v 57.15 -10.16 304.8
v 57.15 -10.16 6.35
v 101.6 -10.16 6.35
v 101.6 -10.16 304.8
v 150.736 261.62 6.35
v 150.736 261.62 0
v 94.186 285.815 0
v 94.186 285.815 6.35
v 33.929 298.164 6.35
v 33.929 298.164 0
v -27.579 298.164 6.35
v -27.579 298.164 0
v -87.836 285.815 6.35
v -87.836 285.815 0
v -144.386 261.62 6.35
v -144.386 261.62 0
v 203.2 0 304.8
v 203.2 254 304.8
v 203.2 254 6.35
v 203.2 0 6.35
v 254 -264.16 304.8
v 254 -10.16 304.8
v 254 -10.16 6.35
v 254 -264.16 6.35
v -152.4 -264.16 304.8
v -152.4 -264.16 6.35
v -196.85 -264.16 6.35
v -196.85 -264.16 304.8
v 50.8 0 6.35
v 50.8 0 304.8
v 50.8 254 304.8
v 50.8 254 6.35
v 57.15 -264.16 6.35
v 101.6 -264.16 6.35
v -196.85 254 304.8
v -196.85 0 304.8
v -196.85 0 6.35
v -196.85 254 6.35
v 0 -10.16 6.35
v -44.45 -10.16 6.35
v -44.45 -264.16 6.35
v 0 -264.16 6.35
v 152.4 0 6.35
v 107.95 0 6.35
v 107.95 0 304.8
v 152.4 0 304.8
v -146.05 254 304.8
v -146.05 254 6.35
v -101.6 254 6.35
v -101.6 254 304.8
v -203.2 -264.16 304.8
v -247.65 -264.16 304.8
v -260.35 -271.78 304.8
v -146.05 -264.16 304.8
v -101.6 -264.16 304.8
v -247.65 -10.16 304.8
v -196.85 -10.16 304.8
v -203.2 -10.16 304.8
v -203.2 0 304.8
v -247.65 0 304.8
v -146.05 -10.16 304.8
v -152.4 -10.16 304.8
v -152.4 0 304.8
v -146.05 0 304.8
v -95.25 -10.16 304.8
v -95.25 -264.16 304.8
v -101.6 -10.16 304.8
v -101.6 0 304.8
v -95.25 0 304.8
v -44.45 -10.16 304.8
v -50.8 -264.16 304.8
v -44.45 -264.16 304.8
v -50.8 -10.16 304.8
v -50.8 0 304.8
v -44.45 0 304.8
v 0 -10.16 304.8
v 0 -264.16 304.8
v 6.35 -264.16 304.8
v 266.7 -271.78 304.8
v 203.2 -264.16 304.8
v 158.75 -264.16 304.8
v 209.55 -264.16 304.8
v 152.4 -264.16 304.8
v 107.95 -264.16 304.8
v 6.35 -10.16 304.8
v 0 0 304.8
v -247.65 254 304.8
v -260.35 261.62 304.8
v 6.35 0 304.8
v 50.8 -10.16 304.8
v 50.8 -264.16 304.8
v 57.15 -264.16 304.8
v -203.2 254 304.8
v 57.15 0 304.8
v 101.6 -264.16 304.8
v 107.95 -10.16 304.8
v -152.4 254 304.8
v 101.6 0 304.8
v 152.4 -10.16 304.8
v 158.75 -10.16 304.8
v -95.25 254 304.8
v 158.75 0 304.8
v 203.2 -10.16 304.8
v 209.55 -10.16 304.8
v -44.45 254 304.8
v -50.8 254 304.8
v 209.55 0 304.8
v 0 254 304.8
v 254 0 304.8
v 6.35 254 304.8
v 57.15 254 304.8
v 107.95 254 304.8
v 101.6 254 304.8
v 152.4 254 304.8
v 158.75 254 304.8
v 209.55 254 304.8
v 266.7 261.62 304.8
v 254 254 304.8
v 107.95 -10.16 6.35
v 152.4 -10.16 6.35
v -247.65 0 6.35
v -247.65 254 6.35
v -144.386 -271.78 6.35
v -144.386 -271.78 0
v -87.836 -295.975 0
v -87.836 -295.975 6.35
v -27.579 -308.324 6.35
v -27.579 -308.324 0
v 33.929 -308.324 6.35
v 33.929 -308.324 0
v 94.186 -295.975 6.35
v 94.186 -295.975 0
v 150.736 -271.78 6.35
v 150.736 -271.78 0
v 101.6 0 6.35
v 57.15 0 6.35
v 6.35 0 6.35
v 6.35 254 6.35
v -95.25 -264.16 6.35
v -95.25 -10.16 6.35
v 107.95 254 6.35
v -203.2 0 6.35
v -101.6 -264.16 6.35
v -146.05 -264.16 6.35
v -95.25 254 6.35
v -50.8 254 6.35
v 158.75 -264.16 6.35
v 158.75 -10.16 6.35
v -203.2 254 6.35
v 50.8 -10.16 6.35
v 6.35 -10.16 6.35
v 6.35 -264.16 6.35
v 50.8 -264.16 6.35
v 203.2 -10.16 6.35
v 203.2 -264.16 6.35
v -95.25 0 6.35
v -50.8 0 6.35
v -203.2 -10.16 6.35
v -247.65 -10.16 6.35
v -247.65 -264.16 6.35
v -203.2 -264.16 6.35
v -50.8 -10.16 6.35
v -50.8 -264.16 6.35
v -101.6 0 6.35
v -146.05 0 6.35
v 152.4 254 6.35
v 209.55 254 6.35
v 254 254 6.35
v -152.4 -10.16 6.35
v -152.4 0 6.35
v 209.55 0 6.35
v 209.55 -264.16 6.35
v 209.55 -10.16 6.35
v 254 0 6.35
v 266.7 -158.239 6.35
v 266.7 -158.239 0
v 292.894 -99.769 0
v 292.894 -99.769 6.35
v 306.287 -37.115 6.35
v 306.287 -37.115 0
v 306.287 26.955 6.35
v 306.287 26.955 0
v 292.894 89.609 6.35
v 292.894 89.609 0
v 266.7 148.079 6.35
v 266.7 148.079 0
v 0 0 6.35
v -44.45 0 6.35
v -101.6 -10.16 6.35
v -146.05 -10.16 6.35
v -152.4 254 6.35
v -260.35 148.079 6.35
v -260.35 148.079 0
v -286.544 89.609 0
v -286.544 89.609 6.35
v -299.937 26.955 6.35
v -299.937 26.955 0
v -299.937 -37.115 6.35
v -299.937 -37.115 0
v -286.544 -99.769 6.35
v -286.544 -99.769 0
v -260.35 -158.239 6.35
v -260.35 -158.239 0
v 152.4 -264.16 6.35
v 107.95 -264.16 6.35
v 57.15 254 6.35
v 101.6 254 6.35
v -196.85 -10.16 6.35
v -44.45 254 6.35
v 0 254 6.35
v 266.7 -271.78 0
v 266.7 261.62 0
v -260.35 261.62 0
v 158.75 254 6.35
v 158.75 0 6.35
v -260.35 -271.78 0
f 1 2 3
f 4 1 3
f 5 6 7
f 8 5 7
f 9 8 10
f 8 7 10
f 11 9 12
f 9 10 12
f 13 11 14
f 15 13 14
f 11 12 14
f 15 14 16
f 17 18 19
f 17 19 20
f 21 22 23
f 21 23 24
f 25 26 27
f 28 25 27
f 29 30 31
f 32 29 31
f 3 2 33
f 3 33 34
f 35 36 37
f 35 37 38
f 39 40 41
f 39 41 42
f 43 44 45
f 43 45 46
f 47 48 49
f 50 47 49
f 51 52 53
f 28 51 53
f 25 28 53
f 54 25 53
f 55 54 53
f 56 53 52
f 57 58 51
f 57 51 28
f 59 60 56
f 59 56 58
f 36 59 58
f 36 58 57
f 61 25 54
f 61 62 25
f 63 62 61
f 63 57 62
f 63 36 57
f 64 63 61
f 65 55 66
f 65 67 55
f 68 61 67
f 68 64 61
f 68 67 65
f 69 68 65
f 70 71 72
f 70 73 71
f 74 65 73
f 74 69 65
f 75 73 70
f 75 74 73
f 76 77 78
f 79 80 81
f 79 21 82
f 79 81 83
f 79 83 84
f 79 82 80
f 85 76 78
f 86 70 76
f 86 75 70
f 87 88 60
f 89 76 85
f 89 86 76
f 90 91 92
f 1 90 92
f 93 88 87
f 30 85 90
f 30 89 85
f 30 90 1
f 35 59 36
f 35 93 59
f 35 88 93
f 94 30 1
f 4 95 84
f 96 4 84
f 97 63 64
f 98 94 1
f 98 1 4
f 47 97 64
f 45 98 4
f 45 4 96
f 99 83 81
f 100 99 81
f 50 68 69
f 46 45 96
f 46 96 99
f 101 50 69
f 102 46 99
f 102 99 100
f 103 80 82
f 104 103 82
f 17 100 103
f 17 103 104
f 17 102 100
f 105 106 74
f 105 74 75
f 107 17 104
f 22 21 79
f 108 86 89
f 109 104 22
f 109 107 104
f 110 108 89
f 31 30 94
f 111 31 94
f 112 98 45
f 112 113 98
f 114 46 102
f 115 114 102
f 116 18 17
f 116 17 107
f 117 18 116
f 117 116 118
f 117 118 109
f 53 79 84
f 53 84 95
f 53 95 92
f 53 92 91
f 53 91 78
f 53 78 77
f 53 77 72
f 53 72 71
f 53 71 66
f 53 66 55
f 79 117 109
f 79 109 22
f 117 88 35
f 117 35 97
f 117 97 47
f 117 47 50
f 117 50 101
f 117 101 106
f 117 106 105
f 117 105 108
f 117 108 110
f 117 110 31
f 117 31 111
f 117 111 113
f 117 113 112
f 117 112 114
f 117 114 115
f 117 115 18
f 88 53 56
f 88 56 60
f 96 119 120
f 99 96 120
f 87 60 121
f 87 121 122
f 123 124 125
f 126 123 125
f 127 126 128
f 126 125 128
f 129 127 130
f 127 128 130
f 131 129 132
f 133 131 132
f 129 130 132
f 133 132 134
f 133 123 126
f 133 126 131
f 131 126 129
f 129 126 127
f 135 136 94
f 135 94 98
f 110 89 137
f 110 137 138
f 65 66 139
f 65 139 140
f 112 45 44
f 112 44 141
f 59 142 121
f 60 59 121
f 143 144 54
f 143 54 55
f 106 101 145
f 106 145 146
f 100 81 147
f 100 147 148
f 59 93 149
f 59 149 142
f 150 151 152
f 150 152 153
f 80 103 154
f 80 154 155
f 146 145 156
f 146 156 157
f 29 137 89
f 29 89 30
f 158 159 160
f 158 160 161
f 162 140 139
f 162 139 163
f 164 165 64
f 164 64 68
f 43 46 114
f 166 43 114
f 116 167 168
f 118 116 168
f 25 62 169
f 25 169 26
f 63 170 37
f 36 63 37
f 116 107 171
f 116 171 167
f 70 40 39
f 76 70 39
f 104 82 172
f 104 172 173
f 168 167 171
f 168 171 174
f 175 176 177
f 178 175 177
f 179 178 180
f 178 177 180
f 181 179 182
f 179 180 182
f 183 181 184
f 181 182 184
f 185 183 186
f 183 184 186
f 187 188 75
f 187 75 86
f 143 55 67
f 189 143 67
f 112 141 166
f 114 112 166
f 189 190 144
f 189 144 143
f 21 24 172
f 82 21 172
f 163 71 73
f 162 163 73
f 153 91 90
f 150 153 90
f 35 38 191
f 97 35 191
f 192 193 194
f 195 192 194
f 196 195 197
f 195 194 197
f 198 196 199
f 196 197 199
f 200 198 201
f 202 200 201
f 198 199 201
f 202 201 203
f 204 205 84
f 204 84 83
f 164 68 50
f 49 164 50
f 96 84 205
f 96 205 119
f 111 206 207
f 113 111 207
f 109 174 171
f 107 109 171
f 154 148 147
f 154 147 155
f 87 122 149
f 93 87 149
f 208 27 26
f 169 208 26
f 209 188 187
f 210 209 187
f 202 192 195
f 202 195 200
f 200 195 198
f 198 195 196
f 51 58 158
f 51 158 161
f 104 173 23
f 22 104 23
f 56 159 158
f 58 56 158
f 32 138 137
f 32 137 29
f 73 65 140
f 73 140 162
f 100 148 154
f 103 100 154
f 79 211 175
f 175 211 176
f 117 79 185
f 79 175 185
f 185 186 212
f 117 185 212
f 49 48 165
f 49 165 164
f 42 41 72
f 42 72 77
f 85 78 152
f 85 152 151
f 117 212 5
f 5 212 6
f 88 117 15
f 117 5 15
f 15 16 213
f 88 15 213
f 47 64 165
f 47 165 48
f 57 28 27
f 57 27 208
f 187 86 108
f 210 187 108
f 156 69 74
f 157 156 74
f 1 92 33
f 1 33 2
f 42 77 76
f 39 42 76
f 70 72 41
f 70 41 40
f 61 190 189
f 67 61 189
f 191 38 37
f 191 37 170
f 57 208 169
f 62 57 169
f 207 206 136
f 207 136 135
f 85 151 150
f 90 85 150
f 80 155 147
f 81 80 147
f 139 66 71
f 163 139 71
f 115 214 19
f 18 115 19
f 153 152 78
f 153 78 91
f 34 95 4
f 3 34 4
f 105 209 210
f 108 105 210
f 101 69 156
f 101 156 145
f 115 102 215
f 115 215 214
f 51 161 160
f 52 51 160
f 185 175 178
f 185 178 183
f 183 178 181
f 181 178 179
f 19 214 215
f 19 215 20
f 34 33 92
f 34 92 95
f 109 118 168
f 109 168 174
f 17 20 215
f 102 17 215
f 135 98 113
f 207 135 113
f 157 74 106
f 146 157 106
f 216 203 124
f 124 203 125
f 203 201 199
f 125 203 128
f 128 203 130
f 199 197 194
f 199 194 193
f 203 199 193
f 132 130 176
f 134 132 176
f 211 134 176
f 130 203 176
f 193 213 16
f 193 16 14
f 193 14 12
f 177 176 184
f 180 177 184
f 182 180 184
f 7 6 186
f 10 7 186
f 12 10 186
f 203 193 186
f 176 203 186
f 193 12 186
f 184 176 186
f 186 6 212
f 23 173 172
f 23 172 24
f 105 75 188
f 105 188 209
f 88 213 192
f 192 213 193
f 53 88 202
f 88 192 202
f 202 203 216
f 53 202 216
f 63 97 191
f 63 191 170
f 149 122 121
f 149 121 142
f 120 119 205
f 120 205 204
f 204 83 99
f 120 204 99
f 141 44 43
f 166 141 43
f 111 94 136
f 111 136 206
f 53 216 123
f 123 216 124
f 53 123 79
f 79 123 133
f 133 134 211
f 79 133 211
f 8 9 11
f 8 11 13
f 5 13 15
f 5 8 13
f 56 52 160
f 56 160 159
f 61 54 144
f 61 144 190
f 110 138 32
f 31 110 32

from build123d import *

# Parameters (mm, degrees)
F0_W     = 44.45
F0_H     = 254
F1_DEPTH = 304.8
F2_DEPTH = 6.35


with BuildPart() as f1:
    # F0 (on Top) → F1 (new body)
    with BuildSketch(Plane.XY):
        with BuildLine():
            ThreePointArc((-247.65, -178.2558048198), (-254.1946774379, -168.3708115465), (-260.35, -158.2387881089))
            Line((-260.35, -158.2387881089), (-260.35, -271.78))
            Line((-260.35, -271.78), (-144.3856654905, -271.78))
            ThreePointArc((-144.3856654905, -271.78), (-150.9341183646, -268.0503778696), (-157.3883631935, -264.16))
            Line((-157.3883631935, -264.16), (-196.85, -264.16))
            Line((-196.85, -264.16), (-196.85, -235.0648677087))
            ThreePointArc((-196.85, -235.0648677087), (-200.0448497603, -232.2467507876), (-203.2, -229.384256257))
            Line((-203.2, -229.384256257), (-203.2, -264.16))
            Line((-203.2, -264.16), (-247.65, -264.16))
            Line((-247.65, -264.16), (-247.65, -178.2558048198))
        make_face()
        with BuildLine():
            Line((150.7356654905, 261.62), (-144.3856654905, 261.62))
            ThreePointArc((-144.3856654905, 261.62), (-150.9341183646, 257.8903778696), (-157.3883631935, 254))
            Line((-157.3883631935, 254), (-152.4, 254))
            Line((-152.4, 254), (-152.4, 0))
            Line((-152.4, 0), (-196.85, 0))
            Line((-196.85, 0), (-196.85, 224.9048677087))
            ThreePointArc((-196.85, 224.9048677087), (-200.0448497603, 222.0867507876), (-203.2, 219.224256257))
            Line((-203.2, 219.224256257), (-203.2, 0))
            Line((-203.2, 0), (-247.65, 0))
            Line((-247.65, 0), (-247.65, 168.0958048198))
            ThreePointArc((-247.65, 168.0958048198), (-254.1946774379, 158.2108115465), (-260.35, 148.0787881089))
            Line((-260.35, 148.0787881089), (-260.35, -158.2387881089))
            ThreePointArc((-260.35, -158.2387881089), (-254.1946774379, -168.3708115465), (-247.65, -178.2558048198))
            Line((-247.65, -178.2558048198), (-247.65, -10.16))
            Line((-247.65, -10.16), (-203.2, -10.16))
            Line((-203.2, -10.16), (-203.2, -229.384256257))
            ThreePointArc((-203.2, -229.384256257), (-200.0448497603, -232.2467507876), (-196.85, -235.0648677087))
            Line((-196.85, -235.0648677087), (-196.85, -10.16))
            Line((-196.85, -10.16), (-152.4, -10.16))
            Line((-152.4, -10.16), (-152.4, -264.16))
            Line((-152.4, -264.16), (-157.3883631935, -264.16))
            ThreePointArc((-157.3883631935, -264.16), (-150.9341183646, -268.0503778696), (-144.3856654905, -271.78))
            Line((-144.3856654905, -271.78), (150.7356654905, -271.78))
            ThreePointArc((150.7356654905, -271.78), (157.2841183646, -268.0503778696), (163.7383631935, -264.16))
            Line((163.7383631935, -264.16), (158.75, -264.16))
            Line((158.75, -264.16), (158.75, -10.16))
            Line((158.75, -10.16), (203.2, -10.16))
            Line((203.2, -10.16), (203.2, -235.0648677087))
            ThreePointArc((203.2, -235.0648677087), (206.3948497603, -232.2467507876), (209.55, -229.384256257))
            Line((209.55, -229.384256257), (209.55, -10.16))
            Line((209.55, -10.16), (254, -10.16))
            Line((254, -10.16), (254, -178.2558048198))
            ThreePointArc((254, -178.2558048198), (260.5446774379, -168.3708115465), (266.7, -158.2387881089))
            Line((266.7, -158.2387881089), (266.7, 148.0787881089))
            ThreePointArc((266.7, 148.0787881089), (260.5446774379, 158.2108115465), (254, 168.0958048198))
            Line((254, 168.0958048198), (254, 0))
            Line((254, 0), (209.55, 0))
            Line((209.55, 0), (209.55, 219.224256257))
            ThreePointArc((209.55, 219.224256257), (206.3948497603, 222.0867507876), (203.2, 224.9048677087))
            Line((203.2, 224.9048677087), (203.2, 0))
            Line((203.2, 0), (158.75, 0))
            Line((158.75, 0), (158.75, 254))
            Line((158.75, 254), (163.7383631935, 254))
            ThreePointArc((163.7383631935, 254), (157.2841183646, 257.8903778696), (150.7356654905, 261.62))
        make_face()
        with Locations((-123.825, -137.16)):
            Rectangle(F0_W, F0_H, mode=Mode.SUBTRACT)
        with Locations((-73.025, -137.16)):
            Rectangle(F0_W, F0_H, mode=Mode.SUBTRACT)
        with Locations((-22.225, -137.16)):
            Rectangle(F0_W, F0_H, mode=Mode.SUBTRACT)
        with Locations((28.575, -137.16)):
            Rectangle(F0_W, F0_H, mode=Mode.SUBTRACT)
        with Locations((79.375, -137.16)):
            Rectangle(F0_W, F0_H, mode=Mode.SUBTRACT)
        with Locations((130.175, -137.16)):
            Rectangle(F0_W, F0_H, mode=Mode.SUBTRACT)
        with Locations((-123.825, 127)):
            Rectangle(F0_W, F0_H, mode=Mode.SUBTRACT)
        with Locations((-73.025, 127)):
            Rectangle(F0_W, F0_H, mode=Mode.SUBTRACT)
        with Locations((-22.225, 127)):
            Rectangle(F0_W, F0_H, mode=Mode.SUBTRACT)
        with Locations((28.575, 127)):
            Rectangle(F0_W, F0_H, mode=Mode.SUBTRACT)
        with Locations((79.375, 127)):
            Rectangle(F0_W, F0_H, mode=Mode.SUBTRACT)
        with Locations((130.175, 127)):
            Rectangle(F0_W, F0_H, mode=Mode.SUBTRACT)
        with BuildLine():
            Line((-144.3856654905, 261.62), (-260.35, 261.62))
            Line((-260.35, 261.62), (-260.35, 148.0787881089))
            ThreePointArc((-260.35, 148.0787881089), (-254.1946774379, 158.2108115465), (-247.65, 168.0958048198))
            Line((-247.65, 168.0958048198), (-247.65, 254))
            Line((-247.65, 254), (-203.2, 254))
            Line((-203.2, 254), (-203.2, 219.224256257))
            ThreePointArc((-203.2, 219.224256257), (-200.0448497603, 222.0867507876), (-196.85, 224.9048677087))
            Line((-196.85, 224.9048677087), (-196.85, 254))
            Line((-196.85, 254), (-157.3883631935, 254))
            ThreePointArc((-157.3883631935, 254), (-150.9341183646, 257.8903778696), (-144.3856654905, 261.62))
        make_face()
        with BuildLine():
            Line((266.7, 261.62), (150.7356654905, 261.62))
            ThreePointArc((150.7356654905, 261.62), (157.2841183646, 257.8903778696), (163.7383631935, 254))
            Line((163.7383631935, 254), (203.2, 254))
            Line((203.2, 254), (203.2, 224.9048677087))
            ThreePointArc((203.2, 224.9048677087), (206.3948497603, 222.0867507876), (209.55, 219.224256257))
            Line((209.55, 219.224256257), (209.55, 254))
            Line((209.55, 254), (254, 254))
            Line((254, 254), (254, 168.0958048198))
            ThreePointArc((254, 168.0958048198), (260.5446774379, 158.2108115465), (266.7, 148.0787881089))
            Line((266.7, 148.0787881089), (266.7, 261.62))
        make_face()
        with BuildLine():
            Line((266.7, -271.78), (266.7, -158.2387881089))
            ThreePointArc((266.7, -158.2387881089), (260.5446774379, -168.3708115465), (254, -178.2558048198))
            Line((254, -178.2558048198), (254, -264.16))
            Line((254, -264.16), (209.55, -264.16))
            Line((209.55, -264.16), (209.55, -229.384256257))
            ThreePointArc((209.55, -229.384256257), (206.3948497603, -232.2467507876), (203.2, -235.0648677087))
            Line((203.2, -235.0648677087), (203.2, -264.16))
            Line((203.2, -264.16), (163.7383631935, -264.16))
            ThreePointArc((163.7383631935, -264.16), (157.2841183646, -268.0503778696), (150.7356654905, -271.78))
            Line((150.7356654905, -271.78), (266.7, -271.78))
        make_face()
    extrude(amount=F1_DEPTH)

    # F0 (on Top) → F2 (join)
    with BuildSketch(Plane.XY):
        with BuildLine():
            Line((-260.35, -158.2387881089), (-260.35, 148.0787881089))
            ThreePointArc((-260.35, 148.0787881089), (-301.625, -5.08), (-260.35, -158.2387881089))
        make_face()
        with BuildLine():
            Line((150.7356654905, 261.62), (-144.3856654905, 261.62))
            ThreePointArc((-144.3856654905, 261.62), (-150.9341183646, 257.8903778696), (-157.3883631935, 254))
            Line((-157.3883631935, 254), (-152.4, 254))
            Line((-152.4, 254), (-152.4, 0))
            Line((-152.4, 0), (-196.85, 0))
            Line((-196.85, 0), (-196.85, 224.9048677087))
            ThreePointArc((-196.85, 224.9048677087), (-200.0448497603, 222.0867507876), (-203.2, 219.224256257))
            Line((-203.2, 219.224256257), (-203.2, 0))
            Line((-203.2, 0), (-247.65, 0))
            Line((-247.65, 0), (-247.65, 168.0958048198))
            ThreePointArc((-247.65, 168.0958048198), (-254.1946774379, 158.2108115465), (-260.35, 148.0787881089))
            Line((-260.35, 148.0787881089), (-260.35, -158.2387881089))
            ThreePointArc((-260.35, -158.2387881089), (-254.1946774379, -168.3708115465), (-247.65, -178.2558048198))
            Line((-247.65, -178.2558048198), (-247.65, -10.16))
            Line((-247.65, -10.16), (-203.2, -10.16))
            Line((-203.2, -10.16), (-203.2, -229.384256257))
            ThreePointArc((-203.2, -229.384256257), (-200.0448497603, -232.2467507876), (-196.85, -235.0648677087))
            Line((-196.85, -235.0648677087), (-196.85, -10.16))
            Line((-196.85, -10.16), (-152.4, -10.16))
            Line((-152.4, -10.16), (-152.4, -264.16))
            Line((-152.4, -264.16), (-157.3883631935, -264.16))
            ThreePointArc((-157.3883631935, -264.16), (-150.9341183646, -268.0503778696), (-144.3856654905, -271.78))
            Line((-144.3856654905, -271.78), (150.7356654905, -271.78))
            ThreePointArc((150.7356654905, -271.78), (157.2841183646, -268.0503778696), (163.7383631935, -264.16))
            Line((163.7383631935, -264.16), (158.75, -264.16))
            Line((158.75, -264.16), (158.75, -10.16))
            Line((158.75, -10.16), (203.2, -10.16))
            Line((203.2, -10.16), (203.2, -235.0648677087))
            ThreePointArc((203.2, -235.0648677087), (206.3948497603, -232.2467507876), (209.55, -229.384256257))
            Line((209.55, -229.384256257), (209.55, -10.16))
            Line((209.55, -10.16), (254, -10.16))
            Line((254, -10.16), (254, -178.2558048198))
            ThreePointArc((254, -178.2558048198), (260.5446774379, -168.3708115465), (266.7, -158.2387881089))
            Line((266.7, -158.2387881089), (266.7, 148.0787881089))
            ThreePointArc((266.7, 148.0787881089), (260.5446774379, 158.2108115465), (254, 168.0958048198))
            Line((254, 168.0958048198), (254, 0))
            Line((254, 0), (209.55, 0))
            Line((209.55, 0), (209.55, 219.224256257))
            ThreePointArc((209.55, 219.224256257), (206.3948497603, 222.0867507876), (203.2, 224.9048677087))
            Line((203.2, 224.9048677087), (203.2, 0))
            Line((203.2, 0), (158.75, 0))
            Line((158.75, 0), (158.75, 254))
            Line((158.75, 254), (163.7383631935, 254))
            ThreePointArc((163.7383631935, 254), (157.2841183646, 257.8903778696), (150.7356654905, 261.62))
        make_face()
        with Locations((-123.825, -137.16)):
            Rectangle(F0_W, F0_H, mode=Mode.SUBTRACT)
        with Locations((-73.025, -137.16)):
            Rectangle(F0_W, F0_H, mode=Mode.SUBTRACT)
        with Locations((-22.225, -137.16)):
            Rectangle(F0_W, F0_H, mode=Mode.SUBTRACT)
        with Locations((28.575, -137.16)):
            Rectangle(F0_W, F0_H, mode=Mode.SUBTRACT)
        with Locations((79.375, -137.16)):
            Rectangle(F0_W, F0_H, mode=Mode.SUBTRACT)
        with Locations((130.175, -137.16)):
            Rectangle(F0_W, F0_H, mode=Mode.SUBTRACT)
        with Locations((-123.825, 127)):
            Rectangle(F0_W, F0_H, mode=Mode.SUBTRACT)
        with Locations((-73.025, 127)):
            Rectangle(F0_W, F0_H, mode=Mode.SUBTRACT)
        with Locations((-22.225, 127)):
            Rectangle(F0_W, F0_H, mode=Mode.SUBTRACT)
        with Locations((28.575, 127)):
            Rectangle(F0_W, F0_H, mode=Mode.SUBTRACT)
        with Locations((79.375, 127)):
            Rectangle(F0_W, F0_H, mode=Mode.SUBTRACT)
        with Locations((130.175, 127)):
            Rectangle(F0_W, F0_H, mode=Mode.SUBTRACT)
        with BuildLine():
            Line((-247.65, -10.16), (-247.65, -178.2558048198))
            ThreePointArc((-247.65, -178.2558048198), (-226.8499761147, -205.0588747928), (-203.2, -229.384256257))
            Line((-203.2, -229.384256257), (-203.2, -10.16))
            Line((-203.2, -10.16), (-247.65, -10.16))
        make_face()
        with BuildLine():
            ThreePointArc((-196.85, -235.0648677087), (-177.7051359973, -250.4071619727), (-157.3883631935, -264.16))
            Line((-157.3883631935, -264.16), (-152.4, -264.16))
            Line((-152.4, -264.16), (-152.4, -10.16))
            Line((-152.4, -10.16), (-196.85, -10.16))
            Line((-196.85, -10.16), (-196.85, -235.0648677087))
        make_face()
        with Locations((-123.825, -137.16)):
            Rectangle(F0_W, F0_H)
        with Locations((-73.025, -137.16)):
            Rectangle(F0_W, F0_H)
        with Locations((-22.225, -137.16)):
            Rectangle(F0_W, F0_H)
        with Locations((28.575, -137.16)):
            Rectangle(F0_W, F0_H)
        with Locations((79.375, -137.16)):
            Rectangle(F0_W, F0_H)
        with Locations((130.175, -137.16)):
            Rectangle(F0_W, F0_H)
        with BuildLine():
            Line((158.75, -264.16), (163.7383631935, -264.16))
            ThreePointArc((163.7383631935, -264.16), (184.0551359973, -250.4071619727), (203.2, -235.0648677087))
            Line((203.2, -235.0648677087), (203.2, -10.16))
            Line((203.2, -10.16), (158.75, -10.16))
            Line((158.75, -10.16), (158.75, -264.16))
        make_face()
        with BuildLine():
            ThreePointArc((209.55, -229.384256257), (233.1999761147, -205.0588747928), (254, -178.2558048198))
            Line((254, -178.2558048198), (254, -10.16))
            Line((254, -10.16), (209.55, -10.16))
            Line((209.55, -10.16), (209.55, -229.384256257))
        make_face()
        with BuildLine():
            Line((254, 0), (254, 168.0958048198))
            ThreePointArc((254, 168.0958048198), (233.1999761147, 194.8988747928), (209.55, 219.224256257))
            Line((209.55, 219.224256257), (209.55, 0))
            Line((209.55, 0), (254, 0))
        make_face()
        with BuildLine():
            ThreePointArc((203.2, 224.9048677087), (184.0551359973, 240.2471619727), (163.7383631935, 254))
            Line((163.7383631935, 254), (158.75, 254))
            Line((158.75, 254), (158.75, 0))
            Line((158.75, 0), (203.2, 0))
            Line((203.2, 0), (203.2, 224.9048677087))
        make_face()
        with Locations((130.175, 127)):
            Rectangle(F0_W, F0_H)
        with Locations((79.375, 127)):
            Rectangle(F0_W, F0_H)
        with Locations((28.575, 127)):
            Rectangle(F0_W, F0_H)
        with Locations((-22.225, 127)):
            Rectangle(F0_W, F0_H)
        with Locations((-123.825, 127)):
            Rectangle(F0_W, F0_H)
        with BuildLine():
            Line((-152.4, 254), (-157.3883631935, 254))
            ThreePointArc((-157.3883631935, 254), (-177.7051359973, 240.2471619727), (-196.85, 224.9048677087))
            Line((-196.85, 224.9048677087), (-196.85, 0))
            Line((-196.85, 0), (-152.4, 0))
            Line((-152.4, 0), (-152.4, 254))
        make_face()
        with BuildLine():
            ThreePointArc((-203.2, 219.224256257), (-226.8499761147, 194.8988747928), (-247.65, 168.0958048198))
            Line((-247.65, 168.0958048198), (-247.65, 0))
            Line((-247.65, 0), (-203.2, 0))
            Line((-203.2, 0), (-203.2, 219.224256257))
        make_face()
        with Locations((-73.025, 127)):
            Rectangle(F0_W, F0_H)
        with BuildLine():
            Line((150.7356654905, -271.78), (-144.3856654905, -271.78))
            ThreePointArc((-144.3856654905, -271.78), (3.175, -309.88), (150.7356654905, -271.78))
        make_face()
        with BuildLine():
            ThreePointArc((307.975, -5.08), (297.4754077469, 74.2314745797), (266.7, 148.0787881089))
            Line((266.7, 148.0787881089), (266.7, -158.2387881089))
            ThreePointArc((266.7, -158.2387881089), (297.4754077469, -84.3914745797), (307.975, -5.08))
        make_face()
        with BuildLine():
            ThreePointArc((150.7356654905, 261.62), (3.175, 299.72), (-144.3856654905, 261.62))
            Line((-144.3856654905, 261.62), (150.7356654905, 261.62))
        make_face()
        with BuildLine():
            ThreePointArc((203.2, -235.0648677087), (184.0551359973, -250.4071619727), (163.7383631935, -264.16))
            Line((163.7383631935, -264.16), (203.2, -264.16))
            Line((203.2, -264.16), (203.2, -235.0648677087))
        make_face()
        with BuildLine():
            ThreePointArc((-203.2, -229.384256257), (-226.8499761147, -205.0588747928), (-247.65, -178.2558048198))
            Line((-247.65, -178.2558048198), (-247.65, -264.16))
            Line((-247.65, -264.16), (-203.2, -264.16))
            Line((-203.2, -264.16), (-203.2, -229.384256257))
        make_face()
        with BuildLine():
            Line((-196.85, -264.16), (-157.3883631935, -264.16))
            ThreePointArc((-157.3883631935, -264.16), (-177.7051359973, -250.4071619727), (-196.85, -235.0648677087))
            Line((-196.85, -235.0648677087), (-196.85, -264.16))
        make_face()
        with BuildLine():
            Line((254, -264.16), (254, -178.2558048198))
            ThreePointArc((254, -178.2558048198), (233.1999761147, -205.0588747928), (209.55, -229.384256257))
            Line((209.55, -229.384256257), (209.55, -264.16))
            Line((209.55, -264.16), (254, -264.16))
        make_face()
        with BuildLine():
            ThreePointArc((209.55, 219.224256257), (233.1999761147, 194.8988747928), (254, 168.0958048198))
            Line((254, 168.0958048198), (254, 254))
            Line((254, 254), (209.55, 254))
            Line((209.55, 254), (209.55, 219.224256257))
        make_face()
        with BuildLine():
            Line((203.2, 254), (163.7383631935, 254))
            ThreePointArc((163.7383631935, 254), (184.0551359973, 240.2471619727), (203.2, 224.9048677087))
            Line((203.2, 224.9048677087), (203.2, 254))
        make_face()
        with BuildLine():
            ThreePointArc((-196.85, 224.9048677087), (-177.7051359973, 240.2471619727), (-157.3883631935, 254))
            Line((-157.3883631935, 254), (-196.85, 254))
            Line((-196.85, 254), (-196.85, 224.9048677087))
        make_face()
        with BuildLine():
            Line((-247.65, 254), (-247.65, 168.0958048198))
            ThreePointArc((-247.65, 168.0958048198), (-226.8499761147, 194.8988747928), (-203.2, 219.224256257))
            Line((-203.2, 219.224256257), (-203.2, 254))
            Line((-203.2, 254), (-247.65, 254))
        make_face()
    extrude(amount=F2_DEPTH)


solid = f1.part
